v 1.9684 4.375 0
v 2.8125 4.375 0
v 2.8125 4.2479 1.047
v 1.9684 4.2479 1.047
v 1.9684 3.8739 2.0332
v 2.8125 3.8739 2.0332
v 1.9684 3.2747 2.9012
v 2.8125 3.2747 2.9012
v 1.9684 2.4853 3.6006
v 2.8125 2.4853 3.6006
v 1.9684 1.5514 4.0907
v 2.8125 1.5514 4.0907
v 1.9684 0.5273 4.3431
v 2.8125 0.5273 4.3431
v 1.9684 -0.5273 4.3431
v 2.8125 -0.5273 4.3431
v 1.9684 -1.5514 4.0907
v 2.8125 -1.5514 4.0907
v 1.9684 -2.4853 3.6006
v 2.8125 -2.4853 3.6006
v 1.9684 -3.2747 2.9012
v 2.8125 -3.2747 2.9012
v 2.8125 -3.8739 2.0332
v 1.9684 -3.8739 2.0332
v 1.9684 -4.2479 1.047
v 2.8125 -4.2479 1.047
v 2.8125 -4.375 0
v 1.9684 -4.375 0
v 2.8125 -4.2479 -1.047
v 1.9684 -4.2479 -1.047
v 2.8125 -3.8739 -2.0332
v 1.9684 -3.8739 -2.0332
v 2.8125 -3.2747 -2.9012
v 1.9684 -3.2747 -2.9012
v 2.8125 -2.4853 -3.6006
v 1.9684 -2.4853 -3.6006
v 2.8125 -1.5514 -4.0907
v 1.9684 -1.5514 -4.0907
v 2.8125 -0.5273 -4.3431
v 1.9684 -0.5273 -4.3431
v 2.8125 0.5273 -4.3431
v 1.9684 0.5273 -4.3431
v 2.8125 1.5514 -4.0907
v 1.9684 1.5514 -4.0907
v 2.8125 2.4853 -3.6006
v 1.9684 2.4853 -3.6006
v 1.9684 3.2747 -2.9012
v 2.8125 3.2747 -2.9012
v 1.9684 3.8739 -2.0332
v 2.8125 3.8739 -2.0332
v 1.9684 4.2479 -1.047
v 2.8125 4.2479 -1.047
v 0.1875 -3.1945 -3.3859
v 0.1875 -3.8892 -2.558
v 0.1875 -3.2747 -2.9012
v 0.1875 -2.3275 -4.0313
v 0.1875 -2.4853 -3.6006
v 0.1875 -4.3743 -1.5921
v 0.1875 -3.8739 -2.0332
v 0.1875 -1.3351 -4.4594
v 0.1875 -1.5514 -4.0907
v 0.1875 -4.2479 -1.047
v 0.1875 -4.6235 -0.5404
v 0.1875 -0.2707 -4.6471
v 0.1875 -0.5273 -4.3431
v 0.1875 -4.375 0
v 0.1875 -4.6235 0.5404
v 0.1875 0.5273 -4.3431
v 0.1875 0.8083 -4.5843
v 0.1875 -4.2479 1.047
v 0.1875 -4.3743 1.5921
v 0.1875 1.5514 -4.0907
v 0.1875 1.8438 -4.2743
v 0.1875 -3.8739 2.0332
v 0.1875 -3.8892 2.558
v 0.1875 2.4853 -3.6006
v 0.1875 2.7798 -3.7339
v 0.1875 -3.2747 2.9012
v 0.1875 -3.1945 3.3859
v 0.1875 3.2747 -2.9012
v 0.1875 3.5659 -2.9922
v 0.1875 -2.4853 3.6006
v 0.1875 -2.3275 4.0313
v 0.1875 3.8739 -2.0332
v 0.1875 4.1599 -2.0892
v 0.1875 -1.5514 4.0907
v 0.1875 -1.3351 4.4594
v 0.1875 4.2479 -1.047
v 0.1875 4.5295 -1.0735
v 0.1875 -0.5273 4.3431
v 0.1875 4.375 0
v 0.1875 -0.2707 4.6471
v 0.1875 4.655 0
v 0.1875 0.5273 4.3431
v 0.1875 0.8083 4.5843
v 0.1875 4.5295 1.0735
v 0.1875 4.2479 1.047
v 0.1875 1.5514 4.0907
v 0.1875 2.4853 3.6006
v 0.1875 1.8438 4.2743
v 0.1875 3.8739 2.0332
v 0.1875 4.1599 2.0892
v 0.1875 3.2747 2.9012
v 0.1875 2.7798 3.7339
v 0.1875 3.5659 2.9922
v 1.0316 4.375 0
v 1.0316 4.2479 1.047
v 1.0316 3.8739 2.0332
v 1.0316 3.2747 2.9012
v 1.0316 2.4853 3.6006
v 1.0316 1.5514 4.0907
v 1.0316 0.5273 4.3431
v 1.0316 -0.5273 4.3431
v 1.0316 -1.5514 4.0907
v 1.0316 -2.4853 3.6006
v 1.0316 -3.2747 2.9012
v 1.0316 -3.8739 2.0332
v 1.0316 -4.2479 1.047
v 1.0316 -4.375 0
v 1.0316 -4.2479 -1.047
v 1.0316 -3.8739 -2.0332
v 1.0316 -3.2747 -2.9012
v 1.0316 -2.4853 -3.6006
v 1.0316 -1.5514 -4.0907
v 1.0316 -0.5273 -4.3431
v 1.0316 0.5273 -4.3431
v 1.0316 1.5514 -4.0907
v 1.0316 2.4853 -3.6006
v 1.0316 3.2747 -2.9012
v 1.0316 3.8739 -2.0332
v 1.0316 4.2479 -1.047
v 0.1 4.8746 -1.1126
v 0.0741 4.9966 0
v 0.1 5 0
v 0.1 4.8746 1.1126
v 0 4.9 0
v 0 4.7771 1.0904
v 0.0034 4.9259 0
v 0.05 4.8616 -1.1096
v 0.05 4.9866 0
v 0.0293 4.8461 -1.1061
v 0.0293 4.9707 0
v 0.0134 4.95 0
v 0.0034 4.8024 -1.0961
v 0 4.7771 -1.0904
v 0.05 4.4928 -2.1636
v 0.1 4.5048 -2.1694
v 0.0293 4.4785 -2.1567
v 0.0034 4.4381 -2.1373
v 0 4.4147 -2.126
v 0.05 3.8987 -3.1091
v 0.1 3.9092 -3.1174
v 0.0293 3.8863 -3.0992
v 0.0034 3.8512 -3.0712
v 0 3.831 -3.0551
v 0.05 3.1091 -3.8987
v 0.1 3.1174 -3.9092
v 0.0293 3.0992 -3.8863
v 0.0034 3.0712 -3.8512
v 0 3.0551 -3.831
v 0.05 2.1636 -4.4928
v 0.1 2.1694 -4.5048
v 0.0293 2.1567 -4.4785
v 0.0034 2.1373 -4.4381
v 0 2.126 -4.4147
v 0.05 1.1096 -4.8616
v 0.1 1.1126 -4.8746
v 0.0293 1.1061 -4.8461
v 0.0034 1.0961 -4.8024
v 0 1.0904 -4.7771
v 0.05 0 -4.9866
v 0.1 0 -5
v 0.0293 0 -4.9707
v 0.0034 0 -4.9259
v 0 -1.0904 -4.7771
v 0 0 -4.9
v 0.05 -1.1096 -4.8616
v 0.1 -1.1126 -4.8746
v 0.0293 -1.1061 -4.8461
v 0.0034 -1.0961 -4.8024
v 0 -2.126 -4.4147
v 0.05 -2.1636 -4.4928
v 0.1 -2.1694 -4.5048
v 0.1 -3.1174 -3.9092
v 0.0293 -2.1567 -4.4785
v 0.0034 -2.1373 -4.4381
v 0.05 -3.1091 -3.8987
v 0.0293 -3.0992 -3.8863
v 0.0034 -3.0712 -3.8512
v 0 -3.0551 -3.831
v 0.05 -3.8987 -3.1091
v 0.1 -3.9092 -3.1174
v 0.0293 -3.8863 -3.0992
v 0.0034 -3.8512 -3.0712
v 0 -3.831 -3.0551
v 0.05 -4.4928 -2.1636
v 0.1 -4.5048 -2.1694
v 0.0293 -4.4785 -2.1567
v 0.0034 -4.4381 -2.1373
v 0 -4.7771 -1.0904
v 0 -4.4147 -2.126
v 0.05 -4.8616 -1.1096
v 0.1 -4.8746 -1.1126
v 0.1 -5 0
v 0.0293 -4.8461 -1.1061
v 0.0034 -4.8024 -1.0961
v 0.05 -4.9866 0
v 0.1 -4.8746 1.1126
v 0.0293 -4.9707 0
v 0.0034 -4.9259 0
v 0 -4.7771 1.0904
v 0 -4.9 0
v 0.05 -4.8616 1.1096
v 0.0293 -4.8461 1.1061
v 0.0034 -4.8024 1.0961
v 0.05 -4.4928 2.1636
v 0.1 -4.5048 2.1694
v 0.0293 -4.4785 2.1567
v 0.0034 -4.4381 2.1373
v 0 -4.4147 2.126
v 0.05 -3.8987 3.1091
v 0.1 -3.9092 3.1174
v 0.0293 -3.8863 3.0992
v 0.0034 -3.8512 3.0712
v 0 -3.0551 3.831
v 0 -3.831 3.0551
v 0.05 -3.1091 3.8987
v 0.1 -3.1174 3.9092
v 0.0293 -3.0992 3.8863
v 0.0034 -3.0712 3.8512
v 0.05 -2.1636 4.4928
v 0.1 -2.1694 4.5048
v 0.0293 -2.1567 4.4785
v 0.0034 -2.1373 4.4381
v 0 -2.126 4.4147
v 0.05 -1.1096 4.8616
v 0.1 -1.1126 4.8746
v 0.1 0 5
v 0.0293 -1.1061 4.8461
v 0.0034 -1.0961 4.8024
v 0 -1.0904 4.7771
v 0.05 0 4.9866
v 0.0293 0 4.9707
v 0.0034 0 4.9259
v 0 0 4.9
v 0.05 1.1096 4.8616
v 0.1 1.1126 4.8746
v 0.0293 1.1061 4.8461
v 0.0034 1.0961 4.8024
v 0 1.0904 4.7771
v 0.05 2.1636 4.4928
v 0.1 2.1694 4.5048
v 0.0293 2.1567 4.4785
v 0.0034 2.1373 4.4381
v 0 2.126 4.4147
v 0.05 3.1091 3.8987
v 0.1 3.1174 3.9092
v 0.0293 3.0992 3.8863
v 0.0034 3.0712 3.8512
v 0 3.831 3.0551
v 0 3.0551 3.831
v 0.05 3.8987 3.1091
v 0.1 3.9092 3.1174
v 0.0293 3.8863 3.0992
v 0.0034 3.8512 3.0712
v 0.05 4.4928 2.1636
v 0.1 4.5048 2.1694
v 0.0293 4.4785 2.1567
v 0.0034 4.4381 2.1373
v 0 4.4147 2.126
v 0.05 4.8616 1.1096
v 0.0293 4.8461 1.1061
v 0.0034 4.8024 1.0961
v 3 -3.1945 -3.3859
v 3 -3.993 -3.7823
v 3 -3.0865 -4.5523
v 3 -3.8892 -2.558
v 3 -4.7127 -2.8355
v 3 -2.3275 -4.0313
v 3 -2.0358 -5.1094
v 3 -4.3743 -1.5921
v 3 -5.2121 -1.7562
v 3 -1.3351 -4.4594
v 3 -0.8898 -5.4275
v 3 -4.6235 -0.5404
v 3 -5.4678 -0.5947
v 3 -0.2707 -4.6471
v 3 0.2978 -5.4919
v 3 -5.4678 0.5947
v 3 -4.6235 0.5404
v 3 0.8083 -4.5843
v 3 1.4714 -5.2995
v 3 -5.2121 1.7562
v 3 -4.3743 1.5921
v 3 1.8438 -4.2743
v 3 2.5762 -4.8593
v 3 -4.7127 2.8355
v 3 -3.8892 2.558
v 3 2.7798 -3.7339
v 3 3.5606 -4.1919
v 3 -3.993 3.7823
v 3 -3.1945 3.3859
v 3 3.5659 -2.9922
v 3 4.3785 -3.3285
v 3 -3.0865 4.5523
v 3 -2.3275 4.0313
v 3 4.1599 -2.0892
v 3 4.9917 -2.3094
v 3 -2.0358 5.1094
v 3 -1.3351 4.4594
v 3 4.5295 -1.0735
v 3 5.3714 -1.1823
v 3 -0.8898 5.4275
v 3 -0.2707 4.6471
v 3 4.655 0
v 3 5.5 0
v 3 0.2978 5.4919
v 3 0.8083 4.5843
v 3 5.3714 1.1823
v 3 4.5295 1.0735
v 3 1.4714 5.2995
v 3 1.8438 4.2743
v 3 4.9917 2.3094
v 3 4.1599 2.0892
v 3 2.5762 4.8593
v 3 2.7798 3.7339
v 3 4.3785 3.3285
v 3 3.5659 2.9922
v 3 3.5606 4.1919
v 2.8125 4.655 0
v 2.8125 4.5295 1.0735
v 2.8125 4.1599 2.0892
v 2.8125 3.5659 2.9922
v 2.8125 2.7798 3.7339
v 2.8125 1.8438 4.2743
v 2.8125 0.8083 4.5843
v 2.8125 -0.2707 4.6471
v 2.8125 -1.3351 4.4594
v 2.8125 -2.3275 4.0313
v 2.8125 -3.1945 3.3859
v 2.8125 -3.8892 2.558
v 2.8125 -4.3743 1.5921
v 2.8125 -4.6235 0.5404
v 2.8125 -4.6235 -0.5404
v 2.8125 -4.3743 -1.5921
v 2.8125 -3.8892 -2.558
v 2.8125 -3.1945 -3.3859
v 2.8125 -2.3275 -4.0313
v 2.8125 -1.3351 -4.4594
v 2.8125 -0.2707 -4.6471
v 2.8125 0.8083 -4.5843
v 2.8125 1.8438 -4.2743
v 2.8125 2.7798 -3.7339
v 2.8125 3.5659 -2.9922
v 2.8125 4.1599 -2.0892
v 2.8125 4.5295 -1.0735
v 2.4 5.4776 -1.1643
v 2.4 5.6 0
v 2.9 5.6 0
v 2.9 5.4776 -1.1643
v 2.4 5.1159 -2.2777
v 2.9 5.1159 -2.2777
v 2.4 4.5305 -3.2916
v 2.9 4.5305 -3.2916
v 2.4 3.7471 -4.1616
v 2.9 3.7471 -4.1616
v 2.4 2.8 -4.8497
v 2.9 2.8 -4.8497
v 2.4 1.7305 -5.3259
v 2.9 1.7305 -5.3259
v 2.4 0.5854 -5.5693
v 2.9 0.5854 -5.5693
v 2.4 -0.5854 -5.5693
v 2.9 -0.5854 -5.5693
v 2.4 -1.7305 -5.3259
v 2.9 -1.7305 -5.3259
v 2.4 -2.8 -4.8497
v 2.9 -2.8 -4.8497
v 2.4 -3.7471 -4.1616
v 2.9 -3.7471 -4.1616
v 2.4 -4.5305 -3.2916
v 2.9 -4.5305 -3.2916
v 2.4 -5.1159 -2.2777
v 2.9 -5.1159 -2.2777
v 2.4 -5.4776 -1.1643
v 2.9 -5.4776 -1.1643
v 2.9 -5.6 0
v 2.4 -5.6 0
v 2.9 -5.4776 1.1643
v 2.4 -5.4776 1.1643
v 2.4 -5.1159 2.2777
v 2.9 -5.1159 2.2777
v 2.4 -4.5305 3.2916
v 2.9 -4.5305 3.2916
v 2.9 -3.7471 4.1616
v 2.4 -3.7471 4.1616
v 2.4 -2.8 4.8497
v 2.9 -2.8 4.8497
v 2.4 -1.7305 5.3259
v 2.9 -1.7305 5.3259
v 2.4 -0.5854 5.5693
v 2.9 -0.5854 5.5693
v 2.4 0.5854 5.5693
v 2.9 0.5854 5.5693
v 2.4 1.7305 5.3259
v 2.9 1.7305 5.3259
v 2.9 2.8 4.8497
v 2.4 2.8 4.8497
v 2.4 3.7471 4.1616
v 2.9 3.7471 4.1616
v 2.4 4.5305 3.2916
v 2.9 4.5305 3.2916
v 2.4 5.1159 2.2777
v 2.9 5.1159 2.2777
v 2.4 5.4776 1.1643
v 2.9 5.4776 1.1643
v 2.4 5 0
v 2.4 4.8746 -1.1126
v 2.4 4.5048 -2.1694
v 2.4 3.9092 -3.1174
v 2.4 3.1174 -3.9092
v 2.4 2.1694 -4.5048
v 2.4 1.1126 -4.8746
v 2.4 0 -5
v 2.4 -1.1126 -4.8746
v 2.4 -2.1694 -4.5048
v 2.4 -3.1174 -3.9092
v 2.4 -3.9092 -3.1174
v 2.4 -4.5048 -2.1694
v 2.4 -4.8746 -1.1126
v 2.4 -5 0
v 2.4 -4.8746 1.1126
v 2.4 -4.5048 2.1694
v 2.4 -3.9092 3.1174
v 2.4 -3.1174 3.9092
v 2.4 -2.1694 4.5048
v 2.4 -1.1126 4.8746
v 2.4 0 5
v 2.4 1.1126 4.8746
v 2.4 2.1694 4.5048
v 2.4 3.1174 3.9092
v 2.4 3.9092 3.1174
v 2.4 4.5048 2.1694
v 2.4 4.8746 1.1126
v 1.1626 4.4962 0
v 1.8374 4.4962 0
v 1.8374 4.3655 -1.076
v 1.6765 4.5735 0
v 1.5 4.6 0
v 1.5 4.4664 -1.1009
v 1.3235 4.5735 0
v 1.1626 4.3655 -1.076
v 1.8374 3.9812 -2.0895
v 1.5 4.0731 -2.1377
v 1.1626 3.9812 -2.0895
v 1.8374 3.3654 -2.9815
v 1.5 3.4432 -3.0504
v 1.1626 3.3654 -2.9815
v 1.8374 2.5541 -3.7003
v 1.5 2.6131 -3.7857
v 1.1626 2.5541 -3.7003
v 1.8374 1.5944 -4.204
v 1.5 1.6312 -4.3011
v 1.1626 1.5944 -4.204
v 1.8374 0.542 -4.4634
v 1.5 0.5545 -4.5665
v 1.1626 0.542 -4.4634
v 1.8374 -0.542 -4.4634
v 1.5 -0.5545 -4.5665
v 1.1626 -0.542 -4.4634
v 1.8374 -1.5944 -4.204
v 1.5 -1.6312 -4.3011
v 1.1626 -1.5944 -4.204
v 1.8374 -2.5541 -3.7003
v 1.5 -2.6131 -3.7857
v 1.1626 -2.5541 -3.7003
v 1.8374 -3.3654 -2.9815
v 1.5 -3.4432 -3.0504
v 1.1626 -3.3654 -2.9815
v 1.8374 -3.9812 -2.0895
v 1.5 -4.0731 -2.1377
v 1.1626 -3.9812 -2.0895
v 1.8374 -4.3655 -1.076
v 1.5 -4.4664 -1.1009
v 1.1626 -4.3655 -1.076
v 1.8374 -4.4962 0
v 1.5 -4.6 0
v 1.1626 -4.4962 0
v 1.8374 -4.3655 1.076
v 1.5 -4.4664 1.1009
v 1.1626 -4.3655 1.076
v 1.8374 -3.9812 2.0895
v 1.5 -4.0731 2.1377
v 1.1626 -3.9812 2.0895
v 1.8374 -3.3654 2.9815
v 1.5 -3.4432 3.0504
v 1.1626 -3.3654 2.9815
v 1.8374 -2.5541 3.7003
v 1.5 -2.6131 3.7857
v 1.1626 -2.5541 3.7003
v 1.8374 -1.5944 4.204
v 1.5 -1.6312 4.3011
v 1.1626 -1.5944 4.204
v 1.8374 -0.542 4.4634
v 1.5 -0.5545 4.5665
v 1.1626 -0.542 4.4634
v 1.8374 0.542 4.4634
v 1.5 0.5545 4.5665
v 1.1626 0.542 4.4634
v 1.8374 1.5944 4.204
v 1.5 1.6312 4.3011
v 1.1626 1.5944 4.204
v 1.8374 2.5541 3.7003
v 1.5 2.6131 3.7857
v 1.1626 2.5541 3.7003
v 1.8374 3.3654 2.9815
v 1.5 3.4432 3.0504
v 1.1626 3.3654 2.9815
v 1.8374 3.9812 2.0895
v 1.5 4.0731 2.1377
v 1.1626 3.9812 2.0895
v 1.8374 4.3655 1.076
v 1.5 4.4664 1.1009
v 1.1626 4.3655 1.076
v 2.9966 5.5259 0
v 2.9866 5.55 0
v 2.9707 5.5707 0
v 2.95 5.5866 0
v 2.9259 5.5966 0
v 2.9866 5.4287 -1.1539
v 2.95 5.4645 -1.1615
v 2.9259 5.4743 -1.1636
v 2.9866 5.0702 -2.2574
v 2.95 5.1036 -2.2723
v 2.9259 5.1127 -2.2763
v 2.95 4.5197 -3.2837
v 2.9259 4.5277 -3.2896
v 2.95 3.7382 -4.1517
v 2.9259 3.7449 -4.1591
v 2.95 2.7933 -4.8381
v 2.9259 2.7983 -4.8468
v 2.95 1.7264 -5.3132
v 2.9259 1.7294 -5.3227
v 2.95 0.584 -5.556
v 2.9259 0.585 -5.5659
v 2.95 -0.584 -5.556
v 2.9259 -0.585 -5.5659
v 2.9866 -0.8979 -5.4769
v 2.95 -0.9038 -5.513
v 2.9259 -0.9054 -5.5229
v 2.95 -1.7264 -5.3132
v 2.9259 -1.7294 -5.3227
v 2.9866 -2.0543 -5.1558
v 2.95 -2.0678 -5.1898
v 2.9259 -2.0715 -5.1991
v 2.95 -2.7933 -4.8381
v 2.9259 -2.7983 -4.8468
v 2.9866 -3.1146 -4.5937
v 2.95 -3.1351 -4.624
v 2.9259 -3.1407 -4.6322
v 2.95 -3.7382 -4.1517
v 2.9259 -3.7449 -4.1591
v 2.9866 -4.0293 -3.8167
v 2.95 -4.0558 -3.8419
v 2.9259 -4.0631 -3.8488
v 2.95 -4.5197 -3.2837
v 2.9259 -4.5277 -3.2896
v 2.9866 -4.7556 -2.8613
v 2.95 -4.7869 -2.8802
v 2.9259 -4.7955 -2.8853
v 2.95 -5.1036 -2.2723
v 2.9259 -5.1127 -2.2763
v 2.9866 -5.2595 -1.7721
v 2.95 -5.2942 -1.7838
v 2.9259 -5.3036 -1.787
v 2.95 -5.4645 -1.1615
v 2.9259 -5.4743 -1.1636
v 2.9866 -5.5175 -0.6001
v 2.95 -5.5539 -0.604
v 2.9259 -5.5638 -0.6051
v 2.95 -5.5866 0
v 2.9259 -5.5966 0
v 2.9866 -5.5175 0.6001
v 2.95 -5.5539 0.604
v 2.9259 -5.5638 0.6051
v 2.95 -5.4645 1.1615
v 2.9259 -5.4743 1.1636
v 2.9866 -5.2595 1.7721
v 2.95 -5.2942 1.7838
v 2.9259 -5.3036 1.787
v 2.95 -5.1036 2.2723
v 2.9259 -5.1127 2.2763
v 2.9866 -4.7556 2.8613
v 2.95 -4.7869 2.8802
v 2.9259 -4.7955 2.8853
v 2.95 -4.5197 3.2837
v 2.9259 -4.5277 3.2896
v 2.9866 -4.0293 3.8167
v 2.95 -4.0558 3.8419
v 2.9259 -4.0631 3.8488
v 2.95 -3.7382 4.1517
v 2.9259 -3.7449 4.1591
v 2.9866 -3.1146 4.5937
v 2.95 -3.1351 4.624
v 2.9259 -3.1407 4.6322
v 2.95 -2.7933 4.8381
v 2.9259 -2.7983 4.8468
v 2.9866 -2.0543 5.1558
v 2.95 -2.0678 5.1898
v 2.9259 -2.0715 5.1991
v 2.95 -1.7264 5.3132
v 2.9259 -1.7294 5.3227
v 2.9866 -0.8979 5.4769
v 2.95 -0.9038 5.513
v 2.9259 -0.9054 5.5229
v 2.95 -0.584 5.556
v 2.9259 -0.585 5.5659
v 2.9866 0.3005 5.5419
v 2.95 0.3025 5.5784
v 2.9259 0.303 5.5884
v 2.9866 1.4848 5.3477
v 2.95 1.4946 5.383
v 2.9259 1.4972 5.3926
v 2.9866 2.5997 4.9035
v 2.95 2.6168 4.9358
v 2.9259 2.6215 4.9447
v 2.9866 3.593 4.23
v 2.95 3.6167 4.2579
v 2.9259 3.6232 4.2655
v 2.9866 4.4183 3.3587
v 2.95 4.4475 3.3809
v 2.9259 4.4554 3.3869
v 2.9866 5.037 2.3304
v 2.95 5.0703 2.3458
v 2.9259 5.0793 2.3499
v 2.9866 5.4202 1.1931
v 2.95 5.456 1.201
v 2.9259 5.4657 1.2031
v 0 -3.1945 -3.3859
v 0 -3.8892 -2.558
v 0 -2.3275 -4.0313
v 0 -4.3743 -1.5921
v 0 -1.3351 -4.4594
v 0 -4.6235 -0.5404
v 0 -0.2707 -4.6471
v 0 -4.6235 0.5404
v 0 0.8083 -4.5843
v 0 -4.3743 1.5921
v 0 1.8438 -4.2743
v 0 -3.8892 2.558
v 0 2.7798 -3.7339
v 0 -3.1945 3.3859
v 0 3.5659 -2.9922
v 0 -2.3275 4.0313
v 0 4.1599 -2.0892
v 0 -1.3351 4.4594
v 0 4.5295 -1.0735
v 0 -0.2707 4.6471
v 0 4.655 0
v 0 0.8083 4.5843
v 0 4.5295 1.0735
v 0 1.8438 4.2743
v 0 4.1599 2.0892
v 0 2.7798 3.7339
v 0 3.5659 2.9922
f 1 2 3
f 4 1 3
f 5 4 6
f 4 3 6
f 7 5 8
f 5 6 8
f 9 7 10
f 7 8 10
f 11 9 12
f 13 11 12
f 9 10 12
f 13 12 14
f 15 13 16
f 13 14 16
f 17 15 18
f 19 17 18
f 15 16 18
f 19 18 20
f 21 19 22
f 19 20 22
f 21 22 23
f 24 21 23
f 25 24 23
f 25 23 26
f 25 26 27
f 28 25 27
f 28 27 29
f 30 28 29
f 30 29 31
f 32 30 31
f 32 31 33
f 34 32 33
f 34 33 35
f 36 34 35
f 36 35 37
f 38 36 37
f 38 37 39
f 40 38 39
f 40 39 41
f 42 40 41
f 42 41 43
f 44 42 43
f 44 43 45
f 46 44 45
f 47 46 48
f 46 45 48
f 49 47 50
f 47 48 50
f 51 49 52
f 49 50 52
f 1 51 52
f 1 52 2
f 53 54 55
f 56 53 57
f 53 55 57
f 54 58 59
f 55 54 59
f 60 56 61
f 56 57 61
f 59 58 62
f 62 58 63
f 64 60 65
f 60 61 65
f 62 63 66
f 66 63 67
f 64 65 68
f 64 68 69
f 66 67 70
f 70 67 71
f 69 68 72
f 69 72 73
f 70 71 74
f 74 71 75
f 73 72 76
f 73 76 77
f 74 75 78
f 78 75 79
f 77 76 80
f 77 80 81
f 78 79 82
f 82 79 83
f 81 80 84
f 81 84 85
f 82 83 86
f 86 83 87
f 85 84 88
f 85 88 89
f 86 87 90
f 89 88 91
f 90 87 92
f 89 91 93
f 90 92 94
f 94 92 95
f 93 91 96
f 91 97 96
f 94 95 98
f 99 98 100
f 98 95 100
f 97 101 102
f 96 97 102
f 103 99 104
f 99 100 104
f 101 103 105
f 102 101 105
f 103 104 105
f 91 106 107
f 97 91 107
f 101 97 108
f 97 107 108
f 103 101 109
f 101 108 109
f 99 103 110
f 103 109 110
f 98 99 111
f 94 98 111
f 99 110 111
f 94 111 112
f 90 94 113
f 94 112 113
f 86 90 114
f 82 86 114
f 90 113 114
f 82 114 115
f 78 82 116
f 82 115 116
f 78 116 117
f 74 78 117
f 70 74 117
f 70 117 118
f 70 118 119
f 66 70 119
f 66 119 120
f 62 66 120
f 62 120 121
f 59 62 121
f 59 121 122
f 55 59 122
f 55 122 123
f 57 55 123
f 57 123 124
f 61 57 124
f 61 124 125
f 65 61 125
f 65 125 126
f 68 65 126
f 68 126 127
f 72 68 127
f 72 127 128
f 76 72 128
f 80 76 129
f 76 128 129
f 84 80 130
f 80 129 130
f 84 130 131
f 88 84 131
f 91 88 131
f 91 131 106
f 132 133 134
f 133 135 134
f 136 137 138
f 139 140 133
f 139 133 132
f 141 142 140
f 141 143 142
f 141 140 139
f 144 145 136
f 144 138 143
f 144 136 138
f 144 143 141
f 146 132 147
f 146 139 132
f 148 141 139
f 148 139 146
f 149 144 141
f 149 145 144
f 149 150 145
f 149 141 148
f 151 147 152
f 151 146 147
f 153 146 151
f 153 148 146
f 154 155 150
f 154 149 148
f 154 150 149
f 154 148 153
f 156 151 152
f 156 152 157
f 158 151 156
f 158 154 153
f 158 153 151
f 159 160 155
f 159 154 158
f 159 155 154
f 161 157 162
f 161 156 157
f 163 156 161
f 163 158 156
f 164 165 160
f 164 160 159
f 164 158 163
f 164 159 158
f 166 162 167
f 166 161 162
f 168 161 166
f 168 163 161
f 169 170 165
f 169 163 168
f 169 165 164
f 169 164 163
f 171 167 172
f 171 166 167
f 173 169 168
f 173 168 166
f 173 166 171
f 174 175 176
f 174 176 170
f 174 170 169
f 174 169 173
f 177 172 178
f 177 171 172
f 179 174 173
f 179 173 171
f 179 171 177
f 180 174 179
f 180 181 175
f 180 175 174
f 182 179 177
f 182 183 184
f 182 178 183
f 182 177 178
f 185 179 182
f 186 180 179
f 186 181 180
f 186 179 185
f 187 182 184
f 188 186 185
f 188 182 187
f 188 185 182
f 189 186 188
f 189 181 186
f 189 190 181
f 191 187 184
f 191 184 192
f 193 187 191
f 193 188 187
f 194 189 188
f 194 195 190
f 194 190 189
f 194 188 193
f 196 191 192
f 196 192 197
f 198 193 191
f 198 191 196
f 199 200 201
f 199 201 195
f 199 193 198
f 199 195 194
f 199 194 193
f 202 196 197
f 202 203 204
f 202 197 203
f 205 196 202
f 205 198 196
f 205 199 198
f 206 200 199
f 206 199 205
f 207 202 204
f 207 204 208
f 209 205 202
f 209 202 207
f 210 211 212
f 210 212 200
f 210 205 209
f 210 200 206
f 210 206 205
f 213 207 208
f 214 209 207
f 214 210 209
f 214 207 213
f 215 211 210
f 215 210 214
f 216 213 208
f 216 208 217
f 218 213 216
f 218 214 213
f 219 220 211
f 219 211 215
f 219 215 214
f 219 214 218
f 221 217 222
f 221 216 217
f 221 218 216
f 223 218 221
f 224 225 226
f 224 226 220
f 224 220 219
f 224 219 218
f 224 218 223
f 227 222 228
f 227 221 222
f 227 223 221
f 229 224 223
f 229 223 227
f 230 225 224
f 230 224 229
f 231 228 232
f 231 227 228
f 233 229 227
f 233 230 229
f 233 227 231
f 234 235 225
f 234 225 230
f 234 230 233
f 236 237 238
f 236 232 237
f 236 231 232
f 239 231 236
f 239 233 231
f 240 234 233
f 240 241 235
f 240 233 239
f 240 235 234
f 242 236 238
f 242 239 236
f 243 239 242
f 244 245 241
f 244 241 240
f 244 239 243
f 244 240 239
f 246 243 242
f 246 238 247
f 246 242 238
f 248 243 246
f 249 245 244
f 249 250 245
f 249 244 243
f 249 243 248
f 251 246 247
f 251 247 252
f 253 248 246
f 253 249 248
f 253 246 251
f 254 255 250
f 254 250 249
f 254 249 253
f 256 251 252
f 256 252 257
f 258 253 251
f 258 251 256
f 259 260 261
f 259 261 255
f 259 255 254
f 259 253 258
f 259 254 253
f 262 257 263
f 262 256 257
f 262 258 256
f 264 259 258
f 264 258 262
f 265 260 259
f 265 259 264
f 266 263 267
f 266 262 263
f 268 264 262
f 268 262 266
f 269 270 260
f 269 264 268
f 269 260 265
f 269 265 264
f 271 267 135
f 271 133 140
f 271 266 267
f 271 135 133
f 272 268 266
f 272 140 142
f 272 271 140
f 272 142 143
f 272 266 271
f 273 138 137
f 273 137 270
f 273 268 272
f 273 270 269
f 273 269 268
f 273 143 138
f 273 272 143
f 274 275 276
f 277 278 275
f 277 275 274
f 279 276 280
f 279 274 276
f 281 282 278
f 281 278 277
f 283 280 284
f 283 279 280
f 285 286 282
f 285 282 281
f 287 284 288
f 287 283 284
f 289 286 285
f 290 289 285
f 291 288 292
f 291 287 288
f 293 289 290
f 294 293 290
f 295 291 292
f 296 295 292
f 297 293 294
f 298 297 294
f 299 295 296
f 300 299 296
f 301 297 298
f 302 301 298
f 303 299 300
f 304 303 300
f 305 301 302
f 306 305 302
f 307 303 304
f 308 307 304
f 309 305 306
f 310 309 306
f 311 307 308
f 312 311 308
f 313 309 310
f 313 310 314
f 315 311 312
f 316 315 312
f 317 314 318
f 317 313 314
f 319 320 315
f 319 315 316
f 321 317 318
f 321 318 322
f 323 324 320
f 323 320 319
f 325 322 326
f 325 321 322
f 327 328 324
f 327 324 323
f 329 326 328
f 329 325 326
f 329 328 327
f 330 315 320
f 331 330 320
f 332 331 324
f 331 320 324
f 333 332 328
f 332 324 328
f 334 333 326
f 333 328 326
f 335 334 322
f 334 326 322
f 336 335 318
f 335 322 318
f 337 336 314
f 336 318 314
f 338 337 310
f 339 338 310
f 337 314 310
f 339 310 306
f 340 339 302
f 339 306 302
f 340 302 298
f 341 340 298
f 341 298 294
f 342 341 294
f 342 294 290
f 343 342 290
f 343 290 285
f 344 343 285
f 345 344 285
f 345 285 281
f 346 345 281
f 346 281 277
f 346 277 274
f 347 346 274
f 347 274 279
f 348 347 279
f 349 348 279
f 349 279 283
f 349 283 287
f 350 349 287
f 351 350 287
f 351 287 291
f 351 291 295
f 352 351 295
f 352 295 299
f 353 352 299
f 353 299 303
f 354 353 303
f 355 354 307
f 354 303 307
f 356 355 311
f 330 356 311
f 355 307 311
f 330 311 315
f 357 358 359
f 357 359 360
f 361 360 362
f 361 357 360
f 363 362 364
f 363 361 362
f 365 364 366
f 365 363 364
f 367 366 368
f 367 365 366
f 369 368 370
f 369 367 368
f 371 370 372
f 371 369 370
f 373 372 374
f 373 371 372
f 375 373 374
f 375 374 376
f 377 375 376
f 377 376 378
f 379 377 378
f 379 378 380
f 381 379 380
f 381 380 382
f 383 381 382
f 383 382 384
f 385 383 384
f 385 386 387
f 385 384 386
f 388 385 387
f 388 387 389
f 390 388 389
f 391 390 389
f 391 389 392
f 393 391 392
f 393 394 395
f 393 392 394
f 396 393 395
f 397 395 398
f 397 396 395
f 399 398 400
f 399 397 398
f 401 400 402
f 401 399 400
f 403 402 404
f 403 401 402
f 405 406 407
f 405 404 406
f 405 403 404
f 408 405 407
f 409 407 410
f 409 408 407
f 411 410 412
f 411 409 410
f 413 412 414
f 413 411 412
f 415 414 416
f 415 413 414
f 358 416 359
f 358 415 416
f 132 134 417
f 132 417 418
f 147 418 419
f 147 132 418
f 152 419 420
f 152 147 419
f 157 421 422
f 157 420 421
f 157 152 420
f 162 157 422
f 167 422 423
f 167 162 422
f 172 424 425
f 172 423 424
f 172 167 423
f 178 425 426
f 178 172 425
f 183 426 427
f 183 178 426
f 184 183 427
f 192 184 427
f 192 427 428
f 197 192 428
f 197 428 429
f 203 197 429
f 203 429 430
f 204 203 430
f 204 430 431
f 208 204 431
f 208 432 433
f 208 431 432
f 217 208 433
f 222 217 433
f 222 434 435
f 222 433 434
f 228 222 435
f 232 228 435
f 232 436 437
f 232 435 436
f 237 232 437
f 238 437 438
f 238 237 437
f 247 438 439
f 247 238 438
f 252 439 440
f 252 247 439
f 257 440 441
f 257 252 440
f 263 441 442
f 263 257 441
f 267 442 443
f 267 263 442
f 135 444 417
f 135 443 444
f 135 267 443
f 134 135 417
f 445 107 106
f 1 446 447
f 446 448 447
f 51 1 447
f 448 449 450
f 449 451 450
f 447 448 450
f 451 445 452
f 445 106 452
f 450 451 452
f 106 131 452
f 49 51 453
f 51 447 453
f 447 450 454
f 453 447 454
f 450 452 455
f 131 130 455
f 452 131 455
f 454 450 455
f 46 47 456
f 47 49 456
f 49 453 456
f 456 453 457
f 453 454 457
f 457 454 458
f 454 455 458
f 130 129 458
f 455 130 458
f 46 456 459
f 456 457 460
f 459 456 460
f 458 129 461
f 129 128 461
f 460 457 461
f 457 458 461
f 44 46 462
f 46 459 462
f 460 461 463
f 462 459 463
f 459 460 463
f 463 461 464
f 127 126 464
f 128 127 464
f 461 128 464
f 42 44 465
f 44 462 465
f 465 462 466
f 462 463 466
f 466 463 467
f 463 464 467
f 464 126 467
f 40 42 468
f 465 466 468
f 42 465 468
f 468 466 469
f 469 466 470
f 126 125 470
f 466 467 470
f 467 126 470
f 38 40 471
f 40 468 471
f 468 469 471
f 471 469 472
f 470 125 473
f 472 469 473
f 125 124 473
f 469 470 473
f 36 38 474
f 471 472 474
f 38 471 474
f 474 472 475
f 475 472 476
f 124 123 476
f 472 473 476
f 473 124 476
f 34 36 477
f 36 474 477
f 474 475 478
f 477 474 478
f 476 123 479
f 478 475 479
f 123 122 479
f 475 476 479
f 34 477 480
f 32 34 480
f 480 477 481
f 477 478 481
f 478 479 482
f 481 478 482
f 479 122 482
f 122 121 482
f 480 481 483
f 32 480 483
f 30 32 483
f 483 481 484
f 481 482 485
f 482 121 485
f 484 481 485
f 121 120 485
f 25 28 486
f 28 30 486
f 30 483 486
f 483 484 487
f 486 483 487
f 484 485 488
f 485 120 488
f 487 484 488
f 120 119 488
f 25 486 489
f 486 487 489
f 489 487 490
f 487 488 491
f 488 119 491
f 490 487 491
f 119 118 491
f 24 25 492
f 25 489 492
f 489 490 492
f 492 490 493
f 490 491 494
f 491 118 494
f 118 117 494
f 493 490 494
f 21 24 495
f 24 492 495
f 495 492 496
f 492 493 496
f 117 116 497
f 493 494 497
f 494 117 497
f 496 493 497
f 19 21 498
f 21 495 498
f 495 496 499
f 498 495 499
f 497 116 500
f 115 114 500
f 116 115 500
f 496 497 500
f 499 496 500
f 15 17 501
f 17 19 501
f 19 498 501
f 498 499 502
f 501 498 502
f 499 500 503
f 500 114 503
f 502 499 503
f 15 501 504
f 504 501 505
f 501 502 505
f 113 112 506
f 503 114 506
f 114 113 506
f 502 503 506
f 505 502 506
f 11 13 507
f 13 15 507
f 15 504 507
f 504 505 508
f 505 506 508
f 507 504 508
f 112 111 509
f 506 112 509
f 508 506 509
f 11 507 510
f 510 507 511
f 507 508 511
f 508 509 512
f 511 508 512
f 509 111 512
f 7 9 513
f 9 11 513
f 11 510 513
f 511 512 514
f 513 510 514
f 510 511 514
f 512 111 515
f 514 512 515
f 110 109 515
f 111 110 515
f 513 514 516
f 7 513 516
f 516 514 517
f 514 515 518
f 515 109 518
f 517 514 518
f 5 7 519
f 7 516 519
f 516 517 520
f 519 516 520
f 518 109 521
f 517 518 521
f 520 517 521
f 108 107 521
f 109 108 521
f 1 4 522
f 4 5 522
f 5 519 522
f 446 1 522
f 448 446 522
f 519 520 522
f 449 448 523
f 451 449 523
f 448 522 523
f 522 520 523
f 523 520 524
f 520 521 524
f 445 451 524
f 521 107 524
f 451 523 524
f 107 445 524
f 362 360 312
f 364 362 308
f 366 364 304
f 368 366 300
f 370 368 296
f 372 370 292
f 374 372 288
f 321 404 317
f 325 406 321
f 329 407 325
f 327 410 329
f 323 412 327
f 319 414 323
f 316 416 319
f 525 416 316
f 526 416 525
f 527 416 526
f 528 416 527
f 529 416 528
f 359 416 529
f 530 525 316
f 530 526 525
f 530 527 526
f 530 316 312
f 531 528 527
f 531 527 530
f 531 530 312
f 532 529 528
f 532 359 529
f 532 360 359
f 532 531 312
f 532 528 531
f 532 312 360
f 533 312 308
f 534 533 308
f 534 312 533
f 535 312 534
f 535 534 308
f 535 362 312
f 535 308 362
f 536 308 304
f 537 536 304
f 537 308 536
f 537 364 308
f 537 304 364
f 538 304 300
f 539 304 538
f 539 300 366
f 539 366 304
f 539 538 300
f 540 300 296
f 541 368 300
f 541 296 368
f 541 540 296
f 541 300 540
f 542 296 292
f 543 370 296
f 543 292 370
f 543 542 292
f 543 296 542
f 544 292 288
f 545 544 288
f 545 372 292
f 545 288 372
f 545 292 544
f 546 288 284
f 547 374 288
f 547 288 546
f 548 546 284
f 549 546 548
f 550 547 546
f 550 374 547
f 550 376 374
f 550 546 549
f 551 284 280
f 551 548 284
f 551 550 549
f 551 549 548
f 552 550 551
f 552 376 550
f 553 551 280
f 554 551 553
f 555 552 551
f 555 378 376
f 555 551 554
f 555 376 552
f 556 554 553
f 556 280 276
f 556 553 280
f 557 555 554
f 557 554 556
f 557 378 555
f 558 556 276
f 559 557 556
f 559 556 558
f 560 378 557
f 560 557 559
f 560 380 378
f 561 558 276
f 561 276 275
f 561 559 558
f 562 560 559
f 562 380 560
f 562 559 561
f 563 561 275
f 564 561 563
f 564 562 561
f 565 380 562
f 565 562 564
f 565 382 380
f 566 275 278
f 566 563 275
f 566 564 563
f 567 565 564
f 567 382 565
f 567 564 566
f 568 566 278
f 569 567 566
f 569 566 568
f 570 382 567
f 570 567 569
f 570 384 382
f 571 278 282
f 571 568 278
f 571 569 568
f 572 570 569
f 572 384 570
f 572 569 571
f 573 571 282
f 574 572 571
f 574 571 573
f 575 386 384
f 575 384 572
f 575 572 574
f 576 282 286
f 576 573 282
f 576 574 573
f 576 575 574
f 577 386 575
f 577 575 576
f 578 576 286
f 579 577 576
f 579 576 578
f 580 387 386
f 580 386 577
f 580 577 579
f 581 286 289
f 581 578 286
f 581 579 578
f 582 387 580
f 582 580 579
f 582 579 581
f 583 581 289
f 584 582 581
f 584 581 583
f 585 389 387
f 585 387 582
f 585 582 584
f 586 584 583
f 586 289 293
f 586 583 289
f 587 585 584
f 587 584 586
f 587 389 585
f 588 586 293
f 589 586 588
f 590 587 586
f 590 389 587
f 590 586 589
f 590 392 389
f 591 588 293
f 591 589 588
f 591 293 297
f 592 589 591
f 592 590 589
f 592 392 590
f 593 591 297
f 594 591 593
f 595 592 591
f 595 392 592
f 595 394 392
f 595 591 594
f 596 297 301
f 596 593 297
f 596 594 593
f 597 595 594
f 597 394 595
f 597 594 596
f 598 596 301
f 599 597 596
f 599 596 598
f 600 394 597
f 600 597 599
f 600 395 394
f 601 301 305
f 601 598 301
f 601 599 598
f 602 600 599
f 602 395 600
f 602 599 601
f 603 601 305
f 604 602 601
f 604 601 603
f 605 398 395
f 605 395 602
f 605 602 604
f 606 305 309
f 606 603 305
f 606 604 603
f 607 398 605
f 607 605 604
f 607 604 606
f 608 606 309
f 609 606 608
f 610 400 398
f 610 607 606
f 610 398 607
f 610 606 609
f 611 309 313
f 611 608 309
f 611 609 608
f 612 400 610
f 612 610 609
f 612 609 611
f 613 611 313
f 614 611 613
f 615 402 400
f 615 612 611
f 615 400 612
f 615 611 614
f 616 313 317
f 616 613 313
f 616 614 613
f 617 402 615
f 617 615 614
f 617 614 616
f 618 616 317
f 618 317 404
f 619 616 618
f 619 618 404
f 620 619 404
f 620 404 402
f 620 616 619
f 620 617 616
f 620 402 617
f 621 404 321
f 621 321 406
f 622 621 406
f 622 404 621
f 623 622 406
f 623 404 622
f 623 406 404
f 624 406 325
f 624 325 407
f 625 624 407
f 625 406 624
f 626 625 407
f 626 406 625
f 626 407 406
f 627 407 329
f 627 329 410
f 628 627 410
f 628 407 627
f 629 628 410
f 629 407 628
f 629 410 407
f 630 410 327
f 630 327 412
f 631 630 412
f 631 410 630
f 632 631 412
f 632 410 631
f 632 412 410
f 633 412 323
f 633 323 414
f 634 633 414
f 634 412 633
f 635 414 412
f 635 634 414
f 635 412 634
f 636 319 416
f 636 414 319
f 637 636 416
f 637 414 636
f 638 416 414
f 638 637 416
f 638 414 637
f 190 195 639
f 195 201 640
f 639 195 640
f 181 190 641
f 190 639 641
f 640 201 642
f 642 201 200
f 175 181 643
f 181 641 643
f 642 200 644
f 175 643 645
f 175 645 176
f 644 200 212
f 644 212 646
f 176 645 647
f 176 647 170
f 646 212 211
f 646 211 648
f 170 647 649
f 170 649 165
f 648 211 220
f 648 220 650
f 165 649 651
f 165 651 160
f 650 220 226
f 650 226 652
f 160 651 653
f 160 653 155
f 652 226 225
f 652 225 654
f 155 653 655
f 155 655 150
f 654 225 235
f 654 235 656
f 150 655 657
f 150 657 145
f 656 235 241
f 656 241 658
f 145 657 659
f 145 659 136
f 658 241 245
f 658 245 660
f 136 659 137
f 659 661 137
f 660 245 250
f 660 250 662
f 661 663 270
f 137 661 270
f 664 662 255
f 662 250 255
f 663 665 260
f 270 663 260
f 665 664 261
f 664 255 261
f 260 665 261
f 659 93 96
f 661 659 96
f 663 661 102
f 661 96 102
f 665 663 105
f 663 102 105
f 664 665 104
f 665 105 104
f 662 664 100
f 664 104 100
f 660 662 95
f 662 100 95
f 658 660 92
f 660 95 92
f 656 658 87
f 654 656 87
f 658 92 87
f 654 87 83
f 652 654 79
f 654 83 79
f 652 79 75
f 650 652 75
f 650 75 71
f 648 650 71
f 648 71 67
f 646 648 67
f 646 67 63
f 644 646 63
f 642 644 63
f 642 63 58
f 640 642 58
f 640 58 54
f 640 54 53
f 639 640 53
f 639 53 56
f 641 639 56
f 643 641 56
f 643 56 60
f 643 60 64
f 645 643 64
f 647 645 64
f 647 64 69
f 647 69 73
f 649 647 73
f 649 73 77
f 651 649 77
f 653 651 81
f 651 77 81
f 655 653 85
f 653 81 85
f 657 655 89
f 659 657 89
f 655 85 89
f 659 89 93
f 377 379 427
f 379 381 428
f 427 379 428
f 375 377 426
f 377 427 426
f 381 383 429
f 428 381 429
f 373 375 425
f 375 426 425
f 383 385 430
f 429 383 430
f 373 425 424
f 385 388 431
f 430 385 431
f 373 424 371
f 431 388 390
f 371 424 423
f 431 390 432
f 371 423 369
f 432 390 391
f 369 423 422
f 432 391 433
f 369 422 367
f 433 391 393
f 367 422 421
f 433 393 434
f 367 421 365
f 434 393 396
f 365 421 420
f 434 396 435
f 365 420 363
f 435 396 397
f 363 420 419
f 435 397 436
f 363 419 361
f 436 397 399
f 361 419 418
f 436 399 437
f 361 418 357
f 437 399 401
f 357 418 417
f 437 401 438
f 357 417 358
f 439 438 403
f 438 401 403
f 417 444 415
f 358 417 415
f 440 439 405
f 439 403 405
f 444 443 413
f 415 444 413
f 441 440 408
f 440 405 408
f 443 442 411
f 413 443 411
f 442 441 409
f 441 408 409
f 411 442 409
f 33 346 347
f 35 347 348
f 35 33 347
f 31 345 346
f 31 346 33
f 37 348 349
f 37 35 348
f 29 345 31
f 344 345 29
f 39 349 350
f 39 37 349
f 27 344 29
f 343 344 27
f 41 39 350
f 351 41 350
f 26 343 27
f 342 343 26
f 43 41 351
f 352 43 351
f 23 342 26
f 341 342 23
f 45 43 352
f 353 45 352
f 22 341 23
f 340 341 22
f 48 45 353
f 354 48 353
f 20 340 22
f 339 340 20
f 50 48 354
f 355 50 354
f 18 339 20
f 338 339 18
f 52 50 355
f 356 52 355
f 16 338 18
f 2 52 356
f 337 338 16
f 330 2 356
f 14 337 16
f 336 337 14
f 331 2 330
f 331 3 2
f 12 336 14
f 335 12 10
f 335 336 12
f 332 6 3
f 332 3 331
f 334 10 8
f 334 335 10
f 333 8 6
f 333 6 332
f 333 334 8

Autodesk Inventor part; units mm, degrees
sketch "Sketch_1" plane through (0, 0, 0) normal (0, 0, 1) x (1, 0, 0)
  line L0 (3, 0) -> (0, 0)
  line L1 (0, 4.655) -> (0.1875, 4.655)
  line L2 (0.1875, 4.655) -> (0.1875, 4.375)
  line L3 (0.1875, 4.375) -> (1.0316, 4.375)
  arc A0 (1.9684, 4.375) -> (1.0316, 4.375) centre (1.5, 4) ccw
  line L4 (1.9684, 4.375) -> (2.8125, 4.375)
  line L5 (2.8125, 4.375) -> (2.8125, 4.655)
  line L6 (2.8125, 4.655) -> (3, 4.655)
  line L7 (3, 4.655) -> (3, 5.5)
  arc A1 (3, 5.5) -> (2.9, 5.6) centre (2.9, 5.5) ccw
  line L8 (2.9, 5.6) -> (2.4, 5.6)
  line L9 (2.4, 5.6) -> (2.4, 5)
  line L10 (2.4, 5) -> (0.1, 5)
  arc A2 (0.1, 5) -> (0, 4.9) centre (0.1, 4.9) ccw
  line L11 (0, 4.9) -> (0, 4.655)
revolve "Revolution1" add sketch "Sketch_1" angle 360 about axis through (3, 0, 0) along (1, 0, 0)
ref_plane "ip_st_1_XY" through (0, 0, 0) normal (1, 0, 0) x (0, 0, -1)
ref_plane "ip_st_1_YZ" through (0, 0, 0) normal (0, 0, -1) x (0, 1, 0)
ref_plane "ip_st_1_ZX" through (0, 0, 0) normal (0, 1, 0) x (1, 0, 0)
ref_plane "ip_st_2_XY" through (2.8125, 0, 0) normal (-1, 0, 0) x (0, 0, -1)
ref_plane "ip_st_2_YZ" through (2.8125, 0, 0) normal (0, 0, -1) x (0, -1, 0)
ref_plane "ip_st_2_ZX" through (2.8125, 0, 0) normal (0, -1, 0) x (-1, 0, 0)
properties part number "MF106ZZ1 Outer Ring"
